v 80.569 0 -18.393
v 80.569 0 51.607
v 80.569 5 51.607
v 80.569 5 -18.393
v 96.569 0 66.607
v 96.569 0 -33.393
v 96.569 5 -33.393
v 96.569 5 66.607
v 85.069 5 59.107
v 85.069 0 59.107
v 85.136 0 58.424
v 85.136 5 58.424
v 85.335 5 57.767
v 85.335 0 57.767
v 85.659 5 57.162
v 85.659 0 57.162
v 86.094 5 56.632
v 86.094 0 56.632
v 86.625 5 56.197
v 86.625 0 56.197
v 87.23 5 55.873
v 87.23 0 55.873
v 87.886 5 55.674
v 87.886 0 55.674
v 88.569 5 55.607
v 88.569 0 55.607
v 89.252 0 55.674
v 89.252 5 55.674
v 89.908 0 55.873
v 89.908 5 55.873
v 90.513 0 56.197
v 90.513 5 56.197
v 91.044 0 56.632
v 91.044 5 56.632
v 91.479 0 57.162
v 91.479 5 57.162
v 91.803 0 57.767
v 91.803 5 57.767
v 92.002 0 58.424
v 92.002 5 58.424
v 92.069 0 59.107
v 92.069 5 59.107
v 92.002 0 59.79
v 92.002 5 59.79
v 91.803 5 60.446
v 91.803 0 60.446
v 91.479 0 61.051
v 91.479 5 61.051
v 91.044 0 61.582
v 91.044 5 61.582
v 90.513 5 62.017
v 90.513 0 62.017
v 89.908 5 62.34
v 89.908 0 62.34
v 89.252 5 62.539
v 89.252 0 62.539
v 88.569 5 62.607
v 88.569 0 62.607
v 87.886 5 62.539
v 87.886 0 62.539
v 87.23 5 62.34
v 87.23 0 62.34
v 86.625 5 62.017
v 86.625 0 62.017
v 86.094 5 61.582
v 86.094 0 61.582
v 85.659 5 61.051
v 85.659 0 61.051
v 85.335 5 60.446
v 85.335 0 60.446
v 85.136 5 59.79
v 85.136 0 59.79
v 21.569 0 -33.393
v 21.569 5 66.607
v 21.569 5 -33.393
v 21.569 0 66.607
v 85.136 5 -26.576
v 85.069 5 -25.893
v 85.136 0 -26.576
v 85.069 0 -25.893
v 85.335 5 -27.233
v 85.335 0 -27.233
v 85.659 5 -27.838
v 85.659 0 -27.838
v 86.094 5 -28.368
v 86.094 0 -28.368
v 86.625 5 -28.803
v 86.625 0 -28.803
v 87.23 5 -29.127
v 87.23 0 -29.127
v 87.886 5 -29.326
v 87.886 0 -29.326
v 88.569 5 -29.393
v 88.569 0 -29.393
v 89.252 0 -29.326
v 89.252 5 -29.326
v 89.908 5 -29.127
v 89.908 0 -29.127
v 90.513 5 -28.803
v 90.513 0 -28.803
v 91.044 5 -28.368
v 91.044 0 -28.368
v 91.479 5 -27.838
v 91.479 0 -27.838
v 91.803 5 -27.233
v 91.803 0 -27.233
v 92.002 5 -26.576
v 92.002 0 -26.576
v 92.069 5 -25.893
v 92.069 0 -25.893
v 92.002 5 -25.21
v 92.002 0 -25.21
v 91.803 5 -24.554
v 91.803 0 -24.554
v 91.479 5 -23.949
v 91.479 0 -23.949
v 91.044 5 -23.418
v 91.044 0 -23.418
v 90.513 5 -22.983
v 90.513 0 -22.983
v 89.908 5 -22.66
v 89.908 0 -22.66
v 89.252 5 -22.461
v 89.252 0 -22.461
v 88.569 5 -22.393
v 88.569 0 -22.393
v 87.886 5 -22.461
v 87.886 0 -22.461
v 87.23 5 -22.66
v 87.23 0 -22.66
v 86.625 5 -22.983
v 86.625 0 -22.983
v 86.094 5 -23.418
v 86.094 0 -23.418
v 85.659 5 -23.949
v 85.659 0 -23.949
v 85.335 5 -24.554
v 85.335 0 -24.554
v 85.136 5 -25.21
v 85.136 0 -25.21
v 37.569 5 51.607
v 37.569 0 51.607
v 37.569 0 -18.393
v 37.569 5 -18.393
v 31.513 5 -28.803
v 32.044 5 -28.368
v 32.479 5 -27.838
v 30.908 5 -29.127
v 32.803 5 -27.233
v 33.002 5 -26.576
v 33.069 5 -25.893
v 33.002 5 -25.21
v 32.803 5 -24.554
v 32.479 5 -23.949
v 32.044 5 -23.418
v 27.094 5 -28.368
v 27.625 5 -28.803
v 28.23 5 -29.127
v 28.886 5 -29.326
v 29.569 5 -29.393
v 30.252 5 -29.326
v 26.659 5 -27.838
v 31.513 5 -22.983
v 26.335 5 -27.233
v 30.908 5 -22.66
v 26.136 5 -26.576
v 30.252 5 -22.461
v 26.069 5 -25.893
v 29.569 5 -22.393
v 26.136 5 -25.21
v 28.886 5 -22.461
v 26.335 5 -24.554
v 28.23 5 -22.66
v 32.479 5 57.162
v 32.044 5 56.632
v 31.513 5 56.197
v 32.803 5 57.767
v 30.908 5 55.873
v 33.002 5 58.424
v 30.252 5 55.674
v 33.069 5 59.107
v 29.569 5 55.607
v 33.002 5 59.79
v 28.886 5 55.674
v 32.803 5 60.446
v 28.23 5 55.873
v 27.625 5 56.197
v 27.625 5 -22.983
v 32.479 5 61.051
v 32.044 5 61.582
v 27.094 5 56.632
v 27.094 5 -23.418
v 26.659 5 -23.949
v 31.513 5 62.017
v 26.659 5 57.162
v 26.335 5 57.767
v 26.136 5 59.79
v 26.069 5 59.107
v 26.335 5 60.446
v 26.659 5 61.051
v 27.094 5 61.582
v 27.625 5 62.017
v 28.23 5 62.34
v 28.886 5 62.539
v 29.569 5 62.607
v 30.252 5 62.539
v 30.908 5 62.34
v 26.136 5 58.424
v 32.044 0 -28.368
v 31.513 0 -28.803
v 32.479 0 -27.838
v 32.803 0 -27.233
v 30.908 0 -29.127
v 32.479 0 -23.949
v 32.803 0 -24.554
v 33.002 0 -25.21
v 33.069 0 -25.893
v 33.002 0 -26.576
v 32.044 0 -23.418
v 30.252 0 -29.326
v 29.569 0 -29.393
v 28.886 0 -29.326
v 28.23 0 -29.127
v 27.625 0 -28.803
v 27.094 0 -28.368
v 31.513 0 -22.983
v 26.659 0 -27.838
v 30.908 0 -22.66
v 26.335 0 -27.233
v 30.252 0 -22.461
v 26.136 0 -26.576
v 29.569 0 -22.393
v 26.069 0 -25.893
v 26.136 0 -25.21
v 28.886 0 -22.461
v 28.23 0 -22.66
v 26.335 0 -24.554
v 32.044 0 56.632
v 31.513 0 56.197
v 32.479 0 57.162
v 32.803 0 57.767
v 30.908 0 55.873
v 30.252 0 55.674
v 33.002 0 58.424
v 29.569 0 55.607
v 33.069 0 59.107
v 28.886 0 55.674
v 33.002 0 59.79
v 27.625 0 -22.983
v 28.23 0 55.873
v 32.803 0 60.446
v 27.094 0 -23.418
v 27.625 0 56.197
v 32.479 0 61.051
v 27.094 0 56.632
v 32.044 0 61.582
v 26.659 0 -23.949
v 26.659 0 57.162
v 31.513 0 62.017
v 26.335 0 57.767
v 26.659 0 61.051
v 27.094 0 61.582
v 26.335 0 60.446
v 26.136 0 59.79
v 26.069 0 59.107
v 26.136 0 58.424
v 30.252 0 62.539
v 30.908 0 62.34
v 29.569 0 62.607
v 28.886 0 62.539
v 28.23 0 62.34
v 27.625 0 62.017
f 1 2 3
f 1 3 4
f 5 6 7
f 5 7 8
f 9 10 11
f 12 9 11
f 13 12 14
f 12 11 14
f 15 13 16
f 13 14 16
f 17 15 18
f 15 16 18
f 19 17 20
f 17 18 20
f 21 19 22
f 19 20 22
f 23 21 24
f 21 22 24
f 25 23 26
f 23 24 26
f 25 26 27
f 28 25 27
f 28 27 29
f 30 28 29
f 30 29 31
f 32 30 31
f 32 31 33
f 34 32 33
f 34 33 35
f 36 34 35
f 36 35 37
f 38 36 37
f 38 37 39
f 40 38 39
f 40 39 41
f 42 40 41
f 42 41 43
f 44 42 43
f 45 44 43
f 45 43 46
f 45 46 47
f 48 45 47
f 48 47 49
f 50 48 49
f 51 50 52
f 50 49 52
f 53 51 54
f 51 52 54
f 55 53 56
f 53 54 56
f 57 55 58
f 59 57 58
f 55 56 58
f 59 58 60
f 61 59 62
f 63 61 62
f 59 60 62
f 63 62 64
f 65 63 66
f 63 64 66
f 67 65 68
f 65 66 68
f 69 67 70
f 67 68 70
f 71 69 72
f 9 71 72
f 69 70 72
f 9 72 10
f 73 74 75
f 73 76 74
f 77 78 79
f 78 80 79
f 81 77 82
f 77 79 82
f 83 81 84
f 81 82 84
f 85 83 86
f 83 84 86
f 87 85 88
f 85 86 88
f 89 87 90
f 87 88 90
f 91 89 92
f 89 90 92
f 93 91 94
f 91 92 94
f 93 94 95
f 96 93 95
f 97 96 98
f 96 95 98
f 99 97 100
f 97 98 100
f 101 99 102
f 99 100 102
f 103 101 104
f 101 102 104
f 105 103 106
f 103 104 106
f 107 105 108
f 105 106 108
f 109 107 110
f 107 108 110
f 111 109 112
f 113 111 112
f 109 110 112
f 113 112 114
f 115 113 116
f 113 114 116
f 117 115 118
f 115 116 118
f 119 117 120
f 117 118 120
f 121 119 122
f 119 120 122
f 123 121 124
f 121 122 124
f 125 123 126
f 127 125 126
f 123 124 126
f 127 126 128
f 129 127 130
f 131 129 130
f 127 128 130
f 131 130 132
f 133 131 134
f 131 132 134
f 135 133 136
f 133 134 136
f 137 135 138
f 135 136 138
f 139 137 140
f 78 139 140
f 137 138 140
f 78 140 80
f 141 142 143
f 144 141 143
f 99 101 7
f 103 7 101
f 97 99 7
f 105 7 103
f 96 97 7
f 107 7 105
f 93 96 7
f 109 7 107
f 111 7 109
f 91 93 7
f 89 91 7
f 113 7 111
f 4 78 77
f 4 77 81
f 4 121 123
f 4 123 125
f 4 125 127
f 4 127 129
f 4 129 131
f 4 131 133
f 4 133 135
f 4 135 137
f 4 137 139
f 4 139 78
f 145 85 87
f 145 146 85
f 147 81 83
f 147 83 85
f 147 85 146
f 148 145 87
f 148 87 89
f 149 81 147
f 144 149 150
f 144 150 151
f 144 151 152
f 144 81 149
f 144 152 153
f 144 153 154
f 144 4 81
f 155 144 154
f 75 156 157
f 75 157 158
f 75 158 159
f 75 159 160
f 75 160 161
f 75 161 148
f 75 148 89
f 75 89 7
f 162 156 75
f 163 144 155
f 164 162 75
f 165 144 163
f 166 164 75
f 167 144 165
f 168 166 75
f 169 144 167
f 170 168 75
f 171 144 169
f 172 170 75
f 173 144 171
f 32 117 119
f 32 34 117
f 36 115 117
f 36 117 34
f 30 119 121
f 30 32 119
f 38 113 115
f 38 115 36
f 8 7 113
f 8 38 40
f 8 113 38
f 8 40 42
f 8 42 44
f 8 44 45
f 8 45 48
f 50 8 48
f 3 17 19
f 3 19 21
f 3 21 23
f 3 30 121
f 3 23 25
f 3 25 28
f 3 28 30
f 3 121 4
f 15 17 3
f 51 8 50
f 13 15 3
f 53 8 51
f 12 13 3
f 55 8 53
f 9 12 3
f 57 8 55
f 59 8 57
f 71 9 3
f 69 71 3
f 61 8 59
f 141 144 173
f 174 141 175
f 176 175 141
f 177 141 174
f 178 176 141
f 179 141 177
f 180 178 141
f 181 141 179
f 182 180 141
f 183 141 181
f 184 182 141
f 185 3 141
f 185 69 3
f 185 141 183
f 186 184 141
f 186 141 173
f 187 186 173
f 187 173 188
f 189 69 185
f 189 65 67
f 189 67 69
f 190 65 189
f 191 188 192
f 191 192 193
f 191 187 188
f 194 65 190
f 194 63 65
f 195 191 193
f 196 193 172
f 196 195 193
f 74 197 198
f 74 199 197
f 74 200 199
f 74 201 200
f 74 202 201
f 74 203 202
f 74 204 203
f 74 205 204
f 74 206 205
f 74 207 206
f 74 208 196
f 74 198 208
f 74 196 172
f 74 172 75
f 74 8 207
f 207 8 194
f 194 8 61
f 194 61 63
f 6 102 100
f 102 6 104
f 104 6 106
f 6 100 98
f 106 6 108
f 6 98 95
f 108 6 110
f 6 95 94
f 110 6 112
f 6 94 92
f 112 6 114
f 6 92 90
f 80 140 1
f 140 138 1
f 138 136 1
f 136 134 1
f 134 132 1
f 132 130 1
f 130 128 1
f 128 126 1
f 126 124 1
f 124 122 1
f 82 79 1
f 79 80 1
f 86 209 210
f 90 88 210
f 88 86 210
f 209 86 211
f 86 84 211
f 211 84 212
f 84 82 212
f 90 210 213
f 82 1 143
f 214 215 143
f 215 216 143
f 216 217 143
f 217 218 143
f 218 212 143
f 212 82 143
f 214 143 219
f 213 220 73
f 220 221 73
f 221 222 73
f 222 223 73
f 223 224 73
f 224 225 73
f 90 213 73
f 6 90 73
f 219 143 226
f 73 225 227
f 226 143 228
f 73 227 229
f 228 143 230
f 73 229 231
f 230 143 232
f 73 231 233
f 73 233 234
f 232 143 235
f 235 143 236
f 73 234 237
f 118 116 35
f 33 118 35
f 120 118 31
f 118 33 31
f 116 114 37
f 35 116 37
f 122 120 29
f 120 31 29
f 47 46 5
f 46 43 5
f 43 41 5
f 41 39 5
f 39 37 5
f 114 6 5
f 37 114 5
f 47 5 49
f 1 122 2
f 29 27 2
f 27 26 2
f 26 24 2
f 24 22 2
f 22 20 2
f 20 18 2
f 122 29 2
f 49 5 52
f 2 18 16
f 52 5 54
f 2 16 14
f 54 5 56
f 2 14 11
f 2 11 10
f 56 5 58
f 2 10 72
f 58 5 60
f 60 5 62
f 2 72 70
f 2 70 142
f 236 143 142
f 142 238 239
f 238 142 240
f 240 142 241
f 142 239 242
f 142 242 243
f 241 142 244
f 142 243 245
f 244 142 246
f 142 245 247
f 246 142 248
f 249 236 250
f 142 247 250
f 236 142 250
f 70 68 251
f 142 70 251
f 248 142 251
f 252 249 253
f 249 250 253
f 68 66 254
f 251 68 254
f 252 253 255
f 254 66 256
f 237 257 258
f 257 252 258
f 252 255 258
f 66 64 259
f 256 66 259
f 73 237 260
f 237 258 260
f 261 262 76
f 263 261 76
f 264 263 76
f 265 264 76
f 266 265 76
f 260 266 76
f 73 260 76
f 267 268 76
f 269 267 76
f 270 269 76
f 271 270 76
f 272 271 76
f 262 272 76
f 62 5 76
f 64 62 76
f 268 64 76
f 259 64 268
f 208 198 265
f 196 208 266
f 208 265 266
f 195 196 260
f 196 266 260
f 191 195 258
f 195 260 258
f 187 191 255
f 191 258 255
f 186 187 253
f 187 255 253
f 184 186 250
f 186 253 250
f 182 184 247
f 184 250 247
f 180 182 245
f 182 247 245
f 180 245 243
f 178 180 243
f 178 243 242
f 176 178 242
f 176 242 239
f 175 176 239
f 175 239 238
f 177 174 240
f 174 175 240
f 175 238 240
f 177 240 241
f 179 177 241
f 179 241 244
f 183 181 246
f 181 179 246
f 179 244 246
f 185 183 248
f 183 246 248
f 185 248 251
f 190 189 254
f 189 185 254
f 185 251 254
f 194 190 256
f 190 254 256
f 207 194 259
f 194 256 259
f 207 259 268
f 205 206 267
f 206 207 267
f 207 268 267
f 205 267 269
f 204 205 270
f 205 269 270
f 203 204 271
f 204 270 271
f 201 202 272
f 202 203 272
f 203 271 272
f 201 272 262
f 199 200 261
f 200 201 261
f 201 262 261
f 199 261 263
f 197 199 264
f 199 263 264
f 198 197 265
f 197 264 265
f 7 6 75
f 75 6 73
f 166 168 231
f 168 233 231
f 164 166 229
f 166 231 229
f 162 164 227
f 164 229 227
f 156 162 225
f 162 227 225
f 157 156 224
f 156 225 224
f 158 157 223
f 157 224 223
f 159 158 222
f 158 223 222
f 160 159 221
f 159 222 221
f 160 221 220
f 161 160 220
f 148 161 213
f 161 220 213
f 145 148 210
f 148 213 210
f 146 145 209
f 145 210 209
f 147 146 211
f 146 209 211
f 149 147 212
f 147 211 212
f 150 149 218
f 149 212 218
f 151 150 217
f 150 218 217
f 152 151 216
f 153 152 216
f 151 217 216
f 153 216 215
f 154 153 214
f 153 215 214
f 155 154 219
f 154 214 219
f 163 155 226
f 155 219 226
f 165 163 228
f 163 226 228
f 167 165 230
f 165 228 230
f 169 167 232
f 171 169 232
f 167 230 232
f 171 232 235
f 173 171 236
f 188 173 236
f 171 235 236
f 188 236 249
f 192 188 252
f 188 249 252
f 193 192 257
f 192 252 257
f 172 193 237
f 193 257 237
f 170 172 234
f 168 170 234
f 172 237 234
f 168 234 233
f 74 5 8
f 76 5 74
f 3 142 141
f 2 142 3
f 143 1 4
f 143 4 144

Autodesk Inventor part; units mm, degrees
ref_plane "YZ Plane" through (0, 0, 0) normal (1, 0, 0) x (0, 1, 0)
ref_plane "XZ Plane" through (0, 0, 0) normal (0, 1, 0) x (-1, 0, 0)
ref_plane "XY Plane" through (0, 0, 0) normal (0, 0, 1) x (1, 0, 0)
sketch "Boceto1" plane through (0, 0, 0) normal (0, 1, 0) x (-1, 0, 0)
  circle A0 centre (-88.569, 59.1067) radius 3.5
  circle A1 centre (-29.569, 59.1067) radius 3.5
  line L0 (-88.569, 59.1067) -> (-29.569, 59.1067)
  circle A2 centre (-29.569, -25.8933) radius 3.5
  line L1 (-29.569, 59.1067) -> (-29.569, -25.8933)
  circle A3 centre (-88.569, -25.8933) radius 3.5
  line L2 (-29.569, -25.8933) -> (-88.569, -25.8933)
  line L3 (-88.569, -25.8933) -> (-88.569, 59.1067)
  line L4 (-96.569, 66.6067) -> (-21.569, 66.6067)
  line L5 (-21.569, 66.6067) -> (-21.569, 51.6067)
  line L6 (-96.569, 51.6067) -> (-96.569, 66.6067)
  line L7 (-96.569, 66.6067) -> (-21.569, 51.6067) construction
  line L8 (-21.569, 66.6067) -> (-96.569, 51.6067) construction
  line L9 (-37.569, -33.3933) -> (-21.569, -33.3933)
  line L10 (-21.569, -33.3933) -> (-21.569, 66.6067)
  line L11 (-21.569, 66.6067) -> (-37.569, 66.6067)
  line L12 (-37.569, -33.3933) -> (-21.569, 66.6067) construction
  line L13 (-21.569, -33.3933) -> (-37.569, 66.6067) construction
  line L14 (-21.569, -18.3933) -> (-21.569, -33.3933)
  line L15 (-21.569, -33.3933) -> (-96.569, -33.3933)
  line L16 (-96.569, -33.3933) -> (-96.569, -18.3933)
  line L17 (-96.569, -18.3933) -> (-21.569, -33.3933) construction
  line L18 (-21.569, -18.3933) -> (-96.569, -33.3933) construction
  line L19 (-80.569, -33.3933) -> (-96.569, -33.3933)
  line L20 (-96.569, -33.3933) -> (-96.569, 66.6067)
  line L21 (-96.569, 66.6067) -> (-80.569, 66.6067)
  line L22 (-80.569, -33.3933) -> (-96.569, 66.6067) construction
  line L23 (-96.569, -33.3933) -> (-80.569, 66.6067) construction
  line L24 (-80.569, -18.3933) -> (-37.569, -18.3933)
  line L25 (-80.569, 51.6067) -> (-80.569, -18.3933)
  line L26 (-37.569, 51.6067) -> (-37.569, -18.3933)
  circle A4 centre (-88.569, 59.1067) radius 3.5
  circle A5 centre (-29.569, 59.1067) radius 3.5
  circle A6 centre (-29.569, -25.8933) radius 3.5
  circle A7 centre (-88.569, -25.8933) radius 3.5
  line L27 (-37.569, 51.6067) -> (-80.569, 51.6067)
  point P0 (0, 0)
  point P1 (-59.069, 59.1067)
  point P2 (-29.569, 16.6067)
  point P3 (-59.069, -25.8933)
  point P4 (-88.569, 16.6067)
  dimension "d0" = 75
  dimension "d1" = 15
extrude "Extrusión1" add sketch "Boceto1" along normal blind 5 contours L0 A1 L1 A2 L2 A3 L3 A0 | L4 L5 L10 L9 L15 L16 L20 L6
properties part number "jetson_union"
